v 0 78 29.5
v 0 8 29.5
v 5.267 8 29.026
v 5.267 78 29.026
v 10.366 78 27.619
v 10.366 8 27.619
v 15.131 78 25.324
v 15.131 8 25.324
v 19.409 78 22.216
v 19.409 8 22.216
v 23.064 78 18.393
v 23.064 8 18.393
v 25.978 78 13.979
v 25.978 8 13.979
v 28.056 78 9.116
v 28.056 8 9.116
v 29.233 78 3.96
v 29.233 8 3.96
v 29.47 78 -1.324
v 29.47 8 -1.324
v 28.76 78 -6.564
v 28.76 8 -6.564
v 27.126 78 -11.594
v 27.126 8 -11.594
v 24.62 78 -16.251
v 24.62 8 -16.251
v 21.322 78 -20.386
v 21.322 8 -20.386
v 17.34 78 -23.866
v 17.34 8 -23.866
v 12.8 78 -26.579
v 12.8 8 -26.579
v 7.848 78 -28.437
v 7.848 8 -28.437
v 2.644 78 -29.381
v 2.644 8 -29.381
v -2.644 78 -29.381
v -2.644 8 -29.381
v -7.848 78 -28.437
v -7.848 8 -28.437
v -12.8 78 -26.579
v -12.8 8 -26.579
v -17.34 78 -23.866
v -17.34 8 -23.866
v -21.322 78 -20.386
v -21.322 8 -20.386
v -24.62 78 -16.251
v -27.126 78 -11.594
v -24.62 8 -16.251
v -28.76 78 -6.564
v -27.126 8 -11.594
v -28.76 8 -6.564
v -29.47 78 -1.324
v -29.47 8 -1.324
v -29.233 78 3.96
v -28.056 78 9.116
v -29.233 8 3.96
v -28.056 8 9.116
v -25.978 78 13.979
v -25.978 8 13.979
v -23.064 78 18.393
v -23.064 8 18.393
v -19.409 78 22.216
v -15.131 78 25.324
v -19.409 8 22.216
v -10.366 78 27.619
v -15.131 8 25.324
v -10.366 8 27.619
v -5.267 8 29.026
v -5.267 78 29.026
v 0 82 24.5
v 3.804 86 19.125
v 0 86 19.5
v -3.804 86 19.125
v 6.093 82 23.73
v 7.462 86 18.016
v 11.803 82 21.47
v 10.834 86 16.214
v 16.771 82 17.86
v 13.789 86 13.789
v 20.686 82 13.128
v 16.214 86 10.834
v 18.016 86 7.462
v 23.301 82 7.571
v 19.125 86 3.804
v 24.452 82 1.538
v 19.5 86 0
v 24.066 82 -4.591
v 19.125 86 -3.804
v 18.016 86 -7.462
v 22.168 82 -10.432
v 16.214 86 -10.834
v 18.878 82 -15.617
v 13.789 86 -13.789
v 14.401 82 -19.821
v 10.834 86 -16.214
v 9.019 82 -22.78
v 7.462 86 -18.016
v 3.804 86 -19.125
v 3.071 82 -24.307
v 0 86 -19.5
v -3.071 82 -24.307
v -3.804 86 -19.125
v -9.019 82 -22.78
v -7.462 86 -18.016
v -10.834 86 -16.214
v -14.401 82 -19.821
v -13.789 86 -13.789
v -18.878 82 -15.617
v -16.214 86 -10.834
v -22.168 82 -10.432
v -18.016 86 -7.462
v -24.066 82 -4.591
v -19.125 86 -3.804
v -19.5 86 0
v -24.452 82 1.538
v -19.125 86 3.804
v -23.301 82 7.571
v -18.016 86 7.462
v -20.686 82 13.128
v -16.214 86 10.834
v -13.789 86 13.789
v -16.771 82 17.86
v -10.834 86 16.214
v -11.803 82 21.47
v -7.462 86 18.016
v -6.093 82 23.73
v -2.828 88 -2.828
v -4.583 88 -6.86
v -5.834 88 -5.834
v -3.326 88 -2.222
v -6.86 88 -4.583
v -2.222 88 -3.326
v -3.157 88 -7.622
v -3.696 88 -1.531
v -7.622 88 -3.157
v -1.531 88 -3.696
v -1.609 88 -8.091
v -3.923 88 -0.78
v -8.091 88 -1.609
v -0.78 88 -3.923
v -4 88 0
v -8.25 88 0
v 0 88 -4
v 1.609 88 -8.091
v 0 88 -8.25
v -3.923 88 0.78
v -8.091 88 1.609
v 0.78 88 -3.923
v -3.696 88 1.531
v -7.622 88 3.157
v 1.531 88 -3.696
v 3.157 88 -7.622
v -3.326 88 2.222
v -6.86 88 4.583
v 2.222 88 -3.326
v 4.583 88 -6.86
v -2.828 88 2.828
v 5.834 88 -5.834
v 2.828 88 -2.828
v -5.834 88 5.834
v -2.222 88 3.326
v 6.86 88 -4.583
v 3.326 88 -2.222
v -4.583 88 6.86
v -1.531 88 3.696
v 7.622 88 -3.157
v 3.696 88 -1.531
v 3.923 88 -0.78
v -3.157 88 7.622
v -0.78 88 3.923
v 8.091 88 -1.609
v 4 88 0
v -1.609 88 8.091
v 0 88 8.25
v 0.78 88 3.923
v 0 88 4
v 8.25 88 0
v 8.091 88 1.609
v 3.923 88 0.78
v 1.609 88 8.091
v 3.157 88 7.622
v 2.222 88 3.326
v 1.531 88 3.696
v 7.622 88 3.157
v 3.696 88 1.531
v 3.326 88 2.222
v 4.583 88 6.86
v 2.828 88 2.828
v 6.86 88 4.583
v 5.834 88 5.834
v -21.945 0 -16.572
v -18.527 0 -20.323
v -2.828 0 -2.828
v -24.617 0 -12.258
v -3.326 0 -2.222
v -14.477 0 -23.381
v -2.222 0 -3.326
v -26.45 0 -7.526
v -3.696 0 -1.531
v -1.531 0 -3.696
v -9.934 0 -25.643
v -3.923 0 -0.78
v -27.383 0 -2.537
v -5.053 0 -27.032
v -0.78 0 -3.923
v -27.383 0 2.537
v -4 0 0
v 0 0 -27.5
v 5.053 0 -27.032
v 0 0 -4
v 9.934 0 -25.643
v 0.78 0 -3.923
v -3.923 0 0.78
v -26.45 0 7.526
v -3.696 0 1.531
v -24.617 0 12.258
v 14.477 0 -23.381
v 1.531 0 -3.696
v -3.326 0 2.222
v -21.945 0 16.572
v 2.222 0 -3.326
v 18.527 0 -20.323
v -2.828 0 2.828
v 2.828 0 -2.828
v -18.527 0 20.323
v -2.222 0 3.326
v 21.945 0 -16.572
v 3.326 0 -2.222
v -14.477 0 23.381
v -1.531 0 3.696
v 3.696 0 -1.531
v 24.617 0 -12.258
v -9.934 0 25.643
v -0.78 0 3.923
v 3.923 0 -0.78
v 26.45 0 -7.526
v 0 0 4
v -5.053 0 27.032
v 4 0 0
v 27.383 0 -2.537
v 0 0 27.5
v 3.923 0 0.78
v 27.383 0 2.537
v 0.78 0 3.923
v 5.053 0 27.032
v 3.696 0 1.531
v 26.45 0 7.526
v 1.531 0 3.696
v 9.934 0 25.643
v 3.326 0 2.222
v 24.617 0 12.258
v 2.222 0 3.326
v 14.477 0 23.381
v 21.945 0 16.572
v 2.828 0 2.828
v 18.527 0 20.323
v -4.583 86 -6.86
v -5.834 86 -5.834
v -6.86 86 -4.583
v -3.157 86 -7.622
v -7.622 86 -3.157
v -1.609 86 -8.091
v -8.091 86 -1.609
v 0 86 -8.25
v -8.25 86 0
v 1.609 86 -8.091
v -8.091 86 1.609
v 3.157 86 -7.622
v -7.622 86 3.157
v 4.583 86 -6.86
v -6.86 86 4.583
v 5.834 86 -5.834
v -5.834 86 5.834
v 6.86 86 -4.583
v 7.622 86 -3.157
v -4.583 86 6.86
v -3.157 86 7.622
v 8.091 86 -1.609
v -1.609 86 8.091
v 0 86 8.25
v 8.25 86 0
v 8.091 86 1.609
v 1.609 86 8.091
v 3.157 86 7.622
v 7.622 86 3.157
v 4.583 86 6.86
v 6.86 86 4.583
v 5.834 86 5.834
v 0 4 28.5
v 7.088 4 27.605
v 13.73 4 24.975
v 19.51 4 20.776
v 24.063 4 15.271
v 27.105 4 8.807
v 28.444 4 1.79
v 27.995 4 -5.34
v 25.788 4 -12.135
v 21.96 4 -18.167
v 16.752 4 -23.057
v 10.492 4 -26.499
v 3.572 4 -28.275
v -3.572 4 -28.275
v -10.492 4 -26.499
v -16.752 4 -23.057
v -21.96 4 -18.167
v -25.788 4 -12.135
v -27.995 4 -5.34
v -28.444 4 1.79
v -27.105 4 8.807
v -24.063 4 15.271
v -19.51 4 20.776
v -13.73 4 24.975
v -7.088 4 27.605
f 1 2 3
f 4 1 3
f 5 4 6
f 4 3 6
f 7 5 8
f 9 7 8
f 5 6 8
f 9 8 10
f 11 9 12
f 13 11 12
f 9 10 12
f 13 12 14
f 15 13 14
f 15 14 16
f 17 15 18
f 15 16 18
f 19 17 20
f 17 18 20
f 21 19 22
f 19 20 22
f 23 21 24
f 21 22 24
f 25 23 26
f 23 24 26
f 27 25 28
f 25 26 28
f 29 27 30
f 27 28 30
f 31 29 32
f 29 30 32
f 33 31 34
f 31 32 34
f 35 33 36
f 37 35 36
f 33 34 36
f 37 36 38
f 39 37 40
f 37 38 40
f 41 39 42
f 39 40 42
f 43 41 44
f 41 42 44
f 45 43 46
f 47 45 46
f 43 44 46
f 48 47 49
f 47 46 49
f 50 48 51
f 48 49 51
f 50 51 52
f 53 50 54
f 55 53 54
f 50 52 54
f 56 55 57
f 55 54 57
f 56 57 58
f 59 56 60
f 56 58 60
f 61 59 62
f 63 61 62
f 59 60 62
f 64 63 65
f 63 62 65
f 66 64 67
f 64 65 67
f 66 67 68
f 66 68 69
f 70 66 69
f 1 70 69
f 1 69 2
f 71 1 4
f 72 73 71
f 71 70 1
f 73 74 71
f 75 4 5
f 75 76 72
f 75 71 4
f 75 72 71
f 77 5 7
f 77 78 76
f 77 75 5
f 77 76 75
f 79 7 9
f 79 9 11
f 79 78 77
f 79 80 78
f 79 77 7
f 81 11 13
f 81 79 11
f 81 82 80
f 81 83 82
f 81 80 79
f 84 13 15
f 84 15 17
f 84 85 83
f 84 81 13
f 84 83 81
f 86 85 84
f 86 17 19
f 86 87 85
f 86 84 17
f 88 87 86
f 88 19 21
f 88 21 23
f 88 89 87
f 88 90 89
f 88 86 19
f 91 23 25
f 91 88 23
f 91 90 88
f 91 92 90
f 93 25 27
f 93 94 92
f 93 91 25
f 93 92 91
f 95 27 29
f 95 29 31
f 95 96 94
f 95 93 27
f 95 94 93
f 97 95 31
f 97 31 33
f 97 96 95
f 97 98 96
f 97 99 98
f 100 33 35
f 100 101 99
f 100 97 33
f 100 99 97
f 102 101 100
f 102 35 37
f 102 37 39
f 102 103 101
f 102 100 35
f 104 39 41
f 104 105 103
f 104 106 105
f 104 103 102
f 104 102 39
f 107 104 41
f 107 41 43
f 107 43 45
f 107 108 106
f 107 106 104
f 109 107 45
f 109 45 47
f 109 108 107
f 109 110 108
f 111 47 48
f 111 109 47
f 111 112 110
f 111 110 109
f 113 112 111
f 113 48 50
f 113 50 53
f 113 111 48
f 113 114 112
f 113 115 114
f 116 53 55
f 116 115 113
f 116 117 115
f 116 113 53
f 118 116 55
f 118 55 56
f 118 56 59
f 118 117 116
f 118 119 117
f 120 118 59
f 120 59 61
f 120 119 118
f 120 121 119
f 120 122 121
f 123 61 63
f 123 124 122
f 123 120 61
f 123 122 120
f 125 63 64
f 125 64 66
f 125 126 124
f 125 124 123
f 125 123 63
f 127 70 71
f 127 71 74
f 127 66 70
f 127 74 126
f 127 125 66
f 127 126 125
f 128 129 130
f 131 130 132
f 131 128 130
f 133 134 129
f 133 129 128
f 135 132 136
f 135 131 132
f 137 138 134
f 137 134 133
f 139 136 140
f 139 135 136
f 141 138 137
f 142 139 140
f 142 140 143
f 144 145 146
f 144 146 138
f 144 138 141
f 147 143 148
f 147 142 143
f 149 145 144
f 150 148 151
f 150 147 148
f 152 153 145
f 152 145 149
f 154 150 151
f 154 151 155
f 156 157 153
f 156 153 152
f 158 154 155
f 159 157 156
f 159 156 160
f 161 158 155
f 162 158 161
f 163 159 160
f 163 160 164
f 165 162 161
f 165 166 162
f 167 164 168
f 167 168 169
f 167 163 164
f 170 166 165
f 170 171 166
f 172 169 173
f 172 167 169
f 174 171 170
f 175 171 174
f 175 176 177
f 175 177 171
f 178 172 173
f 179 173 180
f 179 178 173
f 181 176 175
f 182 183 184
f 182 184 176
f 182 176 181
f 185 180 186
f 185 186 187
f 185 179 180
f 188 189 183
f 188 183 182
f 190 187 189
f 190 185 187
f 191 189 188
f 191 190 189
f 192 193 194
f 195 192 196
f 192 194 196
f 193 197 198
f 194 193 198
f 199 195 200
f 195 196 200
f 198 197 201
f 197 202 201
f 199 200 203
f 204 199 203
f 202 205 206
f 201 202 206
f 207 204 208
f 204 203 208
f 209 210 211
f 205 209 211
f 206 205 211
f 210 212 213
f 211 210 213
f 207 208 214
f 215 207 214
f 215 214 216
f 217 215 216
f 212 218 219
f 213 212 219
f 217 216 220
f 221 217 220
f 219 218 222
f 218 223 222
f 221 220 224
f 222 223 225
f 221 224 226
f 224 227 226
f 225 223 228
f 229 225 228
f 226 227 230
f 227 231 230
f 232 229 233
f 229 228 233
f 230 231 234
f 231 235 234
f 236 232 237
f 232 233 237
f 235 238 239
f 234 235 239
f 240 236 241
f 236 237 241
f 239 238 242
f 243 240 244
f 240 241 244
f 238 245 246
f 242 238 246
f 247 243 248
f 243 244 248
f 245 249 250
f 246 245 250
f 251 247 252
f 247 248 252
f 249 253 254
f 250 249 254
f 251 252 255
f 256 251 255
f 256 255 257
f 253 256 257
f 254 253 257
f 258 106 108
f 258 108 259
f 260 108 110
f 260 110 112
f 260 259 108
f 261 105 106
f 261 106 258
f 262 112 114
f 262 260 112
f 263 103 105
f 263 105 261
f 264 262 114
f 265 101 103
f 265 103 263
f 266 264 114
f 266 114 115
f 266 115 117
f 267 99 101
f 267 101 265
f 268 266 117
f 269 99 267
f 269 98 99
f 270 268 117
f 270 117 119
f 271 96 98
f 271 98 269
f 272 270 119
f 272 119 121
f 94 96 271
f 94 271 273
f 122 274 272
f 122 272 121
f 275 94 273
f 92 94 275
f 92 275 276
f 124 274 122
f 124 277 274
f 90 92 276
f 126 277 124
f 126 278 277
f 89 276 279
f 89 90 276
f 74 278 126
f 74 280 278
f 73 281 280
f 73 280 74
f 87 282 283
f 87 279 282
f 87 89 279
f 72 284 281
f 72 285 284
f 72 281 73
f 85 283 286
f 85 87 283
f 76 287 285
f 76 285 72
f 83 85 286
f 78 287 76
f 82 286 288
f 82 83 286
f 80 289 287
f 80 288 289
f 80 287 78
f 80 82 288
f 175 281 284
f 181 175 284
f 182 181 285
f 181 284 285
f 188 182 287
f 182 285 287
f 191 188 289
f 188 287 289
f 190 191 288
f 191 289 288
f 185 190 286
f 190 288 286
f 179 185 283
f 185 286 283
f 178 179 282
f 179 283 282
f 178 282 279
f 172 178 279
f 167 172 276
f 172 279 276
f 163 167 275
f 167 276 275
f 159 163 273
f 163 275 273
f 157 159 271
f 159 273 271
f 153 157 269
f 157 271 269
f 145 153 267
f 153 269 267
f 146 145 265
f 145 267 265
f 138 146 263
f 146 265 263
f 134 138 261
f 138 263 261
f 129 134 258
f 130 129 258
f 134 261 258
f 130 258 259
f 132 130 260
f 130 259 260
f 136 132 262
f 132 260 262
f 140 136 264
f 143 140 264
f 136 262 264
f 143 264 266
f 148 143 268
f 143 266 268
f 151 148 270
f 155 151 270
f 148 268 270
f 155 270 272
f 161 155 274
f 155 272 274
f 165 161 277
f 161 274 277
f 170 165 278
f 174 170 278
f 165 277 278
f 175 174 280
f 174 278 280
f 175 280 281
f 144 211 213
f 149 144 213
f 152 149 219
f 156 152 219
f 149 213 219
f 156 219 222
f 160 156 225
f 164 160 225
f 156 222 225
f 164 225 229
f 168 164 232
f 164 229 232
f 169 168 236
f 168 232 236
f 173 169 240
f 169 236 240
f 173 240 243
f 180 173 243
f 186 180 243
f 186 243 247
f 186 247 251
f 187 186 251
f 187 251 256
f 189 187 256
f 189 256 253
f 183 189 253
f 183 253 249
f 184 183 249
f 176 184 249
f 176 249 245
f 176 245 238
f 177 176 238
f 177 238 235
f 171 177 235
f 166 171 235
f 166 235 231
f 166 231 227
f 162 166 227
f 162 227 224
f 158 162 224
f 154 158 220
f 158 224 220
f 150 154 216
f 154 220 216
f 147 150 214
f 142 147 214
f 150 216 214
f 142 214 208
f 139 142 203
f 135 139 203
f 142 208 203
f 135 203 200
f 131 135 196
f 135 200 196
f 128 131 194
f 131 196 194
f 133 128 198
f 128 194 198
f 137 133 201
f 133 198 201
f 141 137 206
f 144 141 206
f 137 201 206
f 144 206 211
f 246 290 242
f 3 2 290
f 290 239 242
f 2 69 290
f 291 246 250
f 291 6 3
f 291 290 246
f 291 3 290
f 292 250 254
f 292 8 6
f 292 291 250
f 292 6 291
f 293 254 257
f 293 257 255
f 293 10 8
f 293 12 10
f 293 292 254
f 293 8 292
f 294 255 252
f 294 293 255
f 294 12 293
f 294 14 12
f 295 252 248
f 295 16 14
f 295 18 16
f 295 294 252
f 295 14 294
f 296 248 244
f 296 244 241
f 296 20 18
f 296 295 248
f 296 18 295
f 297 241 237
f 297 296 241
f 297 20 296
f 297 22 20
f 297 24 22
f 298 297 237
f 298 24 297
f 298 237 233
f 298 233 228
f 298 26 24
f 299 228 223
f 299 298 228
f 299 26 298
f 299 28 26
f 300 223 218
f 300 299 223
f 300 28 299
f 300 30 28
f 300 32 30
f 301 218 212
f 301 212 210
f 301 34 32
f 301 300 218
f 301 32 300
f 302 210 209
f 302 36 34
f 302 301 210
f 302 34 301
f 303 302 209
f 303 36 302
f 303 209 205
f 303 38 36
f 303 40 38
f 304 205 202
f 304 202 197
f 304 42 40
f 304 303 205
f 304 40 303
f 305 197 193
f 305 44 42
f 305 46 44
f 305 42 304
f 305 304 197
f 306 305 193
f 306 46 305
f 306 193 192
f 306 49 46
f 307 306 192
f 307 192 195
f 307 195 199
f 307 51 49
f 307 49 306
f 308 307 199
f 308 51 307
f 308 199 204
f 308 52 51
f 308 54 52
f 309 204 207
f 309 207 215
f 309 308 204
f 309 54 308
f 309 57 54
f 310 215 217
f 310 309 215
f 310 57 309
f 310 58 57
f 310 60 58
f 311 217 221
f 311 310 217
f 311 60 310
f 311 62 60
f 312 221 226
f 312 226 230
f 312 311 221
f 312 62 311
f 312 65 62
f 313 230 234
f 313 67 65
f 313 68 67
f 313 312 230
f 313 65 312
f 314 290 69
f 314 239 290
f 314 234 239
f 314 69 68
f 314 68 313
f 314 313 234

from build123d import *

# Parameters (mm, degrees)
SKETCH1_R           = 29.5
BOSS_EXTRUDE1_DEPTH = 86
CHAMFER1_SIZE       = 8
CHAMFER1_SIZE2      = 10
CHAMFER2_SIZE       = 2
CHAMFER2_SIZE2      = 8
SKETCH3_R           = 8.25
BOSS_EXTRUDE2_DEPTH = 2
SKETCH2_R           = 4
CUT_EXTRUDE1_DEPTH  = 98.388397666


with BuildPart() as part:
    # Sketch1 → Boss-Extrude1 (new body)
    with BuildSketch(Plane(origin=(0, 0, 0), x_dir=(1, 0, 0), z_dir=(0, 1, 0))):
        with Locations(Location((0, 0, 0), (0, 0, 270))):
            Circle(SKETCH1_R)
    extrude(amount=BOSS_EXTRUDE1_DEPTH)

    # Chamfer1
    chamfer1_edges = [part.edges().sort_by_distance(p)[0] for p in [
        (0, 86, -29.5),
    ]]
    chamfer1_side = [part.faces().sort_by_distance(p)[0] for p in [
        (0, 43, -29.5),
    ]]
    chamfer(chamfer1_edges, length=CHAMFER1_SIZE, length2=CHAMFER1_SIZE2, reference=chamfer1_side[0])

    # Chamfer2
    chamfer2_edges = [part.edges().sort_by_distance(p)[0] for p in [
        (0, 0, -29.5),
    ]]
    chamfer2_side = [part.faces().sort_by_distance(p)[0] for p in [
        (0, 0, 0),
    ]]
    chamfer(chamfer2_edges, length=CHAMFER2_SIZE, length2=CHAMFER2_SIZE2, reference=chamfer2_side[0])

    # Sketch3 → Boss-Extrude2 (add)
    with BuildSketch(Plane(origin=(0, 86, 0), x_dir=(1, 0, 0), z_dir=(0, 1, 0))):
        with Locations(Location((0, 0, 0), (0, 0, 270))):
            Circle(SKETCH3_R)
    extrude(amount=BOSS_EXTRUDE2_DEPTH)

    # Sketch2 → Cut-Extrude1 (cut, through all)
    with BuildSketch(Plane.XZ):
        with Locations(Location((0, 0, 0), (0, 0, 270))):
            Circle(SKETCH2_R)
    extrude(amount=-CUT_EXTRUDE1_DEPTH, mode=Mode.SUBTRACT)


solid = part.part
